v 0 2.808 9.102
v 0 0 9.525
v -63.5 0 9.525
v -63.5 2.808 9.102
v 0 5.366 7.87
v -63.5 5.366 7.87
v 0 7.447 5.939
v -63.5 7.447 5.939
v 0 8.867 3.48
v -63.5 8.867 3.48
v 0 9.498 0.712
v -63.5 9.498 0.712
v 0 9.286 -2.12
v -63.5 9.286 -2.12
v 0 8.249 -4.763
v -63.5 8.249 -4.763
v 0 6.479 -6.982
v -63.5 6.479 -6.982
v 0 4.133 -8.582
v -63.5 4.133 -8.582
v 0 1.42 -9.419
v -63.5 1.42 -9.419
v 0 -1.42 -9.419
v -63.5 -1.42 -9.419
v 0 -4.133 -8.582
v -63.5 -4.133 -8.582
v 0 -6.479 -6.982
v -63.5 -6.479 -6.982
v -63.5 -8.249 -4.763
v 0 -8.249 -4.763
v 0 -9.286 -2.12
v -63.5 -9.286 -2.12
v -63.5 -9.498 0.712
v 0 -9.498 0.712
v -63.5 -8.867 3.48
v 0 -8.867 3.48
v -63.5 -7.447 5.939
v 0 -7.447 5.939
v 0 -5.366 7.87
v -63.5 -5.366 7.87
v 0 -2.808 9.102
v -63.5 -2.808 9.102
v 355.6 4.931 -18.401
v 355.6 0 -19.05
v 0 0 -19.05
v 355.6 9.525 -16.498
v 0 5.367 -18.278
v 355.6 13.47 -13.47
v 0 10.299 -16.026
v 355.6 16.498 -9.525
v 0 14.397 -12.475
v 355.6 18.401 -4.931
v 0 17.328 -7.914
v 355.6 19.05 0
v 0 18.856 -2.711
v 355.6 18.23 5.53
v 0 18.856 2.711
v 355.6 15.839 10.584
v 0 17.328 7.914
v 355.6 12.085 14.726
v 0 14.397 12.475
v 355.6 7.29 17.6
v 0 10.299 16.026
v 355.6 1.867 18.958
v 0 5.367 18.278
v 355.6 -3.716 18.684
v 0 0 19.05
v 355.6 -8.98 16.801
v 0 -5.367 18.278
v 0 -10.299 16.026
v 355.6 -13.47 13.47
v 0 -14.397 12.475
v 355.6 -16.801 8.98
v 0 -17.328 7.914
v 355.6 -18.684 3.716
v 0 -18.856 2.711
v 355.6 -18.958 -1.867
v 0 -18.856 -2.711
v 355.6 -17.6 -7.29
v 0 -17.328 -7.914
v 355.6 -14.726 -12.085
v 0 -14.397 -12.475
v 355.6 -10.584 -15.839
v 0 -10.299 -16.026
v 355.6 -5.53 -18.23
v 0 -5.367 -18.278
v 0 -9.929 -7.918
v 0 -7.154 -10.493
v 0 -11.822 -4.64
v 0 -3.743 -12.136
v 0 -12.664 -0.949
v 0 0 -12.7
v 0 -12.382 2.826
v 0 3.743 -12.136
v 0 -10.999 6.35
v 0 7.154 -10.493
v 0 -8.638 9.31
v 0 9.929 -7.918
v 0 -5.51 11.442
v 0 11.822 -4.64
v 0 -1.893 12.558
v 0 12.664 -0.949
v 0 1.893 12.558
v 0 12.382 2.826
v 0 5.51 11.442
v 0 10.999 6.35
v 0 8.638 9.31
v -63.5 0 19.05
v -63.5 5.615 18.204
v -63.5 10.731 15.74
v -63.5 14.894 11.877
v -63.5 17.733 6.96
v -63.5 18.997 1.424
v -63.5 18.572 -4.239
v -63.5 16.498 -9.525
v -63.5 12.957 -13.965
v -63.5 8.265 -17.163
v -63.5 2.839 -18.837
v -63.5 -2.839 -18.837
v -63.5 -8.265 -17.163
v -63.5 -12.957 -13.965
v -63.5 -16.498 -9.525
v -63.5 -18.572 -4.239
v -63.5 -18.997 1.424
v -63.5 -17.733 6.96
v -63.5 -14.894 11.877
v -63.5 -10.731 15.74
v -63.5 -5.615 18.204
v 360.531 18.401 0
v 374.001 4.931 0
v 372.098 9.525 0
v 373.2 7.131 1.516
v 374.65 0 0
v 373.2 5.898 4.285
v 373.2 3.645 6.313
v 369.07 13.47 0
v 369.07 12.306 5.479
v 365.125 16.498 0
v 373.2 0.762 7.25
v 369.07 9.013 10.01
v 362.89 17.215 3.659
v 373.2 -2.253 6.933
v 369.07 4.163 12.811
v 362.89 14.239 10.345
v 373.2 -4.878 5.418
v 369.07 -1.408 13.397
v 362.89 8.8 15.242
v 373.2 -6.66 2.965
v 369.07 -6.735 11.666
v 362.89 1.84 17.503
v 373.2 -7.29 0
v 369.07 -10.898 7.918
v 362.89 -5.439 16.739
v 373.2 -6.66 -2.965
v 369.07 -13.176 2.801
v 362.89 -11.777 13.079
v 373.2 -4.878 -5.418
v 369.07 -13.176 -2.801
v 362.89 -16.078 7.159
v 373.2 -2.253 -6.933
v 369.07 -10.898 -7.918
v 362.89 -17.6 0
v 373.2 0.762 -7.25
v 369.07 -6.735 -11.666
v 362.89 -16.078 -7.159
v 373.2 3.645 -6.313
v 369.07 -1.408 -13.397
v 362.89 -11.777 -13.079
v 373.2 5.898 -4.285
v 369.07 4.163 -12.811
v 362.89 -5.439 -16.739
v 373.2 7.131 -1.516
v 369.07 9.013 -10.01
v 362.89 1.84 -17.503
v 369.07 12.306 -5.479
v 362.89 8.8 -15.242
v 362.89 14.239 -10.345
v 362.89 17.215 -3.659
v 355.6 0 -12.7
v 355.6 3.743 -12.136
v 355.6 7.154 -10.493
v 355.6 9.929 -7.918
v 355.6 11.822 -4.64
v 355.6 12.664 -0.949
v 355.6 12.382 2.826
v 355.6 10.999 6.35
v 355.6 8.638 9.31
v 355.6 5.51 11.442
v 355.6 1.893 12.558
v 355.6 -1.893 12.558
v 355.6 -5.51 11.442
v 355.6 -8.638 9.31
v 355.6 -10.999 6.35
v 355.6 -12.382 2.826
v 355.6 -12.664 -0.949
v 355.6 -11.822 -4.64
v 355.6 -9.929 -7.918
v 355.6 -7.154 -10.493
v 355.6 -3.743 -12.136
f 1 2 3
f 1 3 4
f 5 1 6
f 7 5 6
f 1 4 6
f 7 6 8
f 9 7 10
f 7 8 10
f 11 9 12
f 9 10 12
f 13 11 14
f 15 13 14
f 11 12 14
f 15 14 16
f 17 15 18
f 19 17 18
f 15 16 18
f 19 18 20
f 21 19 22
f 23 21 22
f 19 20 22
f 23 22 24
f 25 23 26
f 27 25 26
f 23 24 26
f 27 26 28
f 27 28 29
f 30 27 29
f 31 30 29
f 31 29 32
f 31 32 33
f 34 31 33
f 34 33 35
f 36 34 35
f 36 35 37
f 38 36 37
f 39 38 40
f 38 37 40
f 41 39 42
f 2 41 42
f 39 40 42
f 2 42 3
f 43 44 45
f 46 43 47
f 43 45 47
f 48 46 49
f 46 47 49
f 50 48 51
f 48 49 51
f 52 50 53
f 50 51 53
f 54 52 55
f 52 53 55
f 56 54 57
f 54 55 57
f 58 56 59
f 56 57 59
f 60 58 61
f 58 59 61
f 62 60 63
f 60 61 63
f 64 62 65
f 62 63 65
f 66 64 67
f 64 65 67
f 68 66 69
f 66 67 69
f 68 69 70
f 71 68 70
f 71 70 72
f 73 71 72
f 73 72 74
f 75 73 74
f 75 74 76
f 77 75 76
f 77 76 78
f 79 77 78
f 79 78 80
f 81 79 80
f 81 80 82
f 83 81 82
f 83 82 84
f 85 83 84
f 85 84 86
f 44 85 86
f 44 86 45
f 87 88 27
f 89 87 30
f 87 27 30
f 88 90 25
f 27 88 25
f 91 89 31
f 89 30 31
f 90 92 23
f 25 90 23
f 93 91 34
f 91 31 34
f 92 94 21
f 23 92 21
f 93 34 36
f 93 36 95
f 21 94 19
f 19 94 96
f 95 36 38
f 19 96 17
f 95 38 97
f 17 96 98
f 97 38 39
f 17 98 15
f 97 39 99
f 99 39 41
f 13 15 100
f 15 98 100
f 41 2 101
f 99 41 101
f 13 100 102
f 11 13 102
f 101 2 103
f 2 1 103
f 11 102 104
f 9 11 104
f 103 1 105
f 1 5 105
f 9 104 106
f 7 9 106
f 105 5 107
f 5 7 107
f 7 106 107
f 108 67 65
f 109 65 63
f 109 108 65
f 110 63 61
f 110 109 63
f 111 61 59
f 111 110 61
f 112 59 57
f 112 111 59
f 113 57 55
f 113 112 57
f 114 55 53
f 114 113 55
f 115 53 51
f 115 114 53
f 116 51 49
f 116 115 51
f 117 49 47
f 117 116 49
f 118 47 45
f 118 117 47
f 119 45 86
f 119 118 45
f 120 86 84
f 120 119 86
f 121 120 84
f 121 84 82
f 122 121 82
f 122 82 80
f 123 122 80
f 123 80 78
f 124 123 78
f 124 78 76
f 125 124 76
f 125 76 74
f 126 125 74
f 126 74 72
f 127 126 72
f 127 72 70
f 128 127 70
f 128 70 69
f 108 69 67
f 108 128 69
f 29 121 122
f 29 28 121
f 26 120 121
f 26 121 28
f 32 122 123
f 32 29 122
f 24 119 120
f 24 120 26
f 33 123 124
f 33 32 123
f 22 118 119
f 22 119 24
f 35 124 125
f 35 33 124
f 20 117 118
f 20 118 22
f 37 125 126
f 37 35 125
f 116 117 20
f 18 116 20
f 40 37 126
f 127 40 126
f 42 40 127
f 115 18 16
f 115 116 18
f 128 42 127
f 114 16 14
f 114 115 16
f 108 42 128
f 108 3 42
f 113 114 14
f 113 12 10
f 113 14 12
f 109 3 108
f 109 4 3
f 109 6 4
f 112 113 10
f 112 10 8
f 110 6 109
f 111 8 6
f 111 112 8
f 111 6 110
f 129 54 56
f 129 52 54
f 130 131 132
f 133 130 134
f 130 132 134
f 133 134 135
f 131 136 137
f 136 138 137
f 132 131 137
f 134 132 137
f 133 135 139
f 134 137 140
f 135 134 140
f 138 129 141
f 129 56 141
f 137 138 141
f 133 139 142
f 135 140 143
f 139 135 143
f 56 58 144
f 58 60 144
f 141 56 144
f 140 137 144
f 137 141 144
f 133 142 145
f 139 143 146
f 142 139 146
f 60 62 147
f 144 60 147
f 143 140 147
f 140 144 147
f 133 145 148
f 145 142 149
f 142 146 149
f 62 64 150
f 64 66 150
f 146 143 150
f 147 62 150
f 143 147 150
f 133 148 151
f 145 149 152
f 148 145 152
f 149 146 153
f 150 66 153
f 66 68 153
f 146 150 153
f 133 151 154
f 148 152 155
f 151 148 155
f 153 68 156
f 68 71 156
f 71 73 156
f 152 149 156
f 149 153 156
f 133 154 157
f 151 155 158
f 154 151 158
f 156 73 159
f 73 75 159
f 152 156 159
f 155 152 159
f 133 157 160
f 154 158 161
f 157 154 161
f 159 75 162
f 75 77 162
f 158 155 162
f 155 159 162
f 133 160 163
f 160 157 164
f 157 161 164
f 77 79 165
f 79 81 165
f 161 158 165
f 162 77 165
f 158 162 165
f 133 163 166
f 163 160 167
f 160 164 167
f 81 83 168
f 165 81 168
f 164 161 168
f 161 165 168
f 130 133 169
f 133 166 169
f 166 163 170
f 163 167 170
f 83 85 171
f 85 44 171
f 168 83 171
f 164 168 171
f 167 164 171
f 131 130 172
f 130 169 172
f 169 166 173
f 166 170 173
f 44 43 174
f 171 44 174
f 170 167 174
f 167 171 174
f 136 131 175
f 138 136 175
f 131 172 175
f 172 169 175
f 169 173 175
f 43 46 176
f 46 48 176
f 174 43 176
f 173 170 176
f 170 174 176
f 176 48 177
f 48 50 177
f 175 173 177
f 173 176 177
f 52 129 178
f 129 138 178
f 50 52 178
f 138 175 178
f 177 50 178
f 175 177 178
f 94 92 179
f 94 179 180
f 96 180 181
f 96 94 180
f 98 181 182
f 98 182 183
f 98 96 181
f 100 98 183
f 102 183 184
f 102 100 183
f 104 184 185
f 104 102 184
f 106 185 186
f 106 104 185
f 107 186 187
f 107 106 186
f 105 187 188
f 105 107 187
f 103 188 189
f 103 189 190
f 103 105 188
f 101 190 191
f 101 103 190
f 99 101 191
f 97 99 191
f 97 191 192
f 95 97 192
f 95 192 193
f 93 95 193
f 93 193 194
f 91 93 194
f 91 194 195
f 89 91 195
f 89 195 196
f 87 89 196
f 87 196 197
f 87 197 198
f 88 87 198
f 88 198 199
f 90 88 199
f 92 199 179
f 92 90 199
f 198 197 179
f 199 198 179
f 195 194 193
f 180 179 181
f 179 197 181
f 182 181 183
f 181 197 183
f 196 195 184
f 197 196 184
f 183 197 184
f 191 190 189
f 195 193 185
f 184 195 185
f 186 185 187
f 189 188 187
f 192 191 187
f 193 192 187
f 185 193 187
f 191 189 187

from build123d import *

# Parameters (mm, degrees)
SKETCH1_R           = 19.05
SKETCH1_R_2         = 12.7
BOSS_EXTRUDE1_DEPTH = 355.6
BOSS_EXTRUDE2_START = 63.5
SKETCH4_R           = 19.05
SKETCH4_R_2         = 9.525
BOSS_EXTRUDE2_DEPTH = 63.5


with BuildPart() as part:
    # Sketch1 → Boss-Extrude1 (new body)
    with BuildSketch(Plane(origin=(0, 0, 0), x_dir=(0, 0, -1), z_dir=(1, 0, 0))):
        Circle(SKETCH1_R)
        Circle(SKETCH1_R_2, mode=Mode.SUBTRACT)
    extrude(amount=BOSS_EXTRUDE1_DEPTH)

    # Sketch3 → Revolve1 (revolve)
    with BuildSketch(Plane.XY):
        with BuildLine():
            Line((355.6, 19.05), (355.6, 0))
            Line((355.6, 0), (374.65, 0))
            ThreePointArc((374.65, 0), (369.070384182, 13.470384182), (355.6, 19.05))
        make_face()
    revolve(axis=Axis((355.6, 0, 0), (1, 0, 0)))

    # Sketch4 → Boss-Extrude2 (add)
    with BuildSketch(Plane.ZY.offset(BOSS_EXTRUDE2_START)):
        Circle(SKETCH4_R)
        Circle(SKETCH4_R_2, mode=Mode.SUBTRACT)
    extrude(amount=-BOSS_EXTRUDE2_DEPTH)


solid = part.part
